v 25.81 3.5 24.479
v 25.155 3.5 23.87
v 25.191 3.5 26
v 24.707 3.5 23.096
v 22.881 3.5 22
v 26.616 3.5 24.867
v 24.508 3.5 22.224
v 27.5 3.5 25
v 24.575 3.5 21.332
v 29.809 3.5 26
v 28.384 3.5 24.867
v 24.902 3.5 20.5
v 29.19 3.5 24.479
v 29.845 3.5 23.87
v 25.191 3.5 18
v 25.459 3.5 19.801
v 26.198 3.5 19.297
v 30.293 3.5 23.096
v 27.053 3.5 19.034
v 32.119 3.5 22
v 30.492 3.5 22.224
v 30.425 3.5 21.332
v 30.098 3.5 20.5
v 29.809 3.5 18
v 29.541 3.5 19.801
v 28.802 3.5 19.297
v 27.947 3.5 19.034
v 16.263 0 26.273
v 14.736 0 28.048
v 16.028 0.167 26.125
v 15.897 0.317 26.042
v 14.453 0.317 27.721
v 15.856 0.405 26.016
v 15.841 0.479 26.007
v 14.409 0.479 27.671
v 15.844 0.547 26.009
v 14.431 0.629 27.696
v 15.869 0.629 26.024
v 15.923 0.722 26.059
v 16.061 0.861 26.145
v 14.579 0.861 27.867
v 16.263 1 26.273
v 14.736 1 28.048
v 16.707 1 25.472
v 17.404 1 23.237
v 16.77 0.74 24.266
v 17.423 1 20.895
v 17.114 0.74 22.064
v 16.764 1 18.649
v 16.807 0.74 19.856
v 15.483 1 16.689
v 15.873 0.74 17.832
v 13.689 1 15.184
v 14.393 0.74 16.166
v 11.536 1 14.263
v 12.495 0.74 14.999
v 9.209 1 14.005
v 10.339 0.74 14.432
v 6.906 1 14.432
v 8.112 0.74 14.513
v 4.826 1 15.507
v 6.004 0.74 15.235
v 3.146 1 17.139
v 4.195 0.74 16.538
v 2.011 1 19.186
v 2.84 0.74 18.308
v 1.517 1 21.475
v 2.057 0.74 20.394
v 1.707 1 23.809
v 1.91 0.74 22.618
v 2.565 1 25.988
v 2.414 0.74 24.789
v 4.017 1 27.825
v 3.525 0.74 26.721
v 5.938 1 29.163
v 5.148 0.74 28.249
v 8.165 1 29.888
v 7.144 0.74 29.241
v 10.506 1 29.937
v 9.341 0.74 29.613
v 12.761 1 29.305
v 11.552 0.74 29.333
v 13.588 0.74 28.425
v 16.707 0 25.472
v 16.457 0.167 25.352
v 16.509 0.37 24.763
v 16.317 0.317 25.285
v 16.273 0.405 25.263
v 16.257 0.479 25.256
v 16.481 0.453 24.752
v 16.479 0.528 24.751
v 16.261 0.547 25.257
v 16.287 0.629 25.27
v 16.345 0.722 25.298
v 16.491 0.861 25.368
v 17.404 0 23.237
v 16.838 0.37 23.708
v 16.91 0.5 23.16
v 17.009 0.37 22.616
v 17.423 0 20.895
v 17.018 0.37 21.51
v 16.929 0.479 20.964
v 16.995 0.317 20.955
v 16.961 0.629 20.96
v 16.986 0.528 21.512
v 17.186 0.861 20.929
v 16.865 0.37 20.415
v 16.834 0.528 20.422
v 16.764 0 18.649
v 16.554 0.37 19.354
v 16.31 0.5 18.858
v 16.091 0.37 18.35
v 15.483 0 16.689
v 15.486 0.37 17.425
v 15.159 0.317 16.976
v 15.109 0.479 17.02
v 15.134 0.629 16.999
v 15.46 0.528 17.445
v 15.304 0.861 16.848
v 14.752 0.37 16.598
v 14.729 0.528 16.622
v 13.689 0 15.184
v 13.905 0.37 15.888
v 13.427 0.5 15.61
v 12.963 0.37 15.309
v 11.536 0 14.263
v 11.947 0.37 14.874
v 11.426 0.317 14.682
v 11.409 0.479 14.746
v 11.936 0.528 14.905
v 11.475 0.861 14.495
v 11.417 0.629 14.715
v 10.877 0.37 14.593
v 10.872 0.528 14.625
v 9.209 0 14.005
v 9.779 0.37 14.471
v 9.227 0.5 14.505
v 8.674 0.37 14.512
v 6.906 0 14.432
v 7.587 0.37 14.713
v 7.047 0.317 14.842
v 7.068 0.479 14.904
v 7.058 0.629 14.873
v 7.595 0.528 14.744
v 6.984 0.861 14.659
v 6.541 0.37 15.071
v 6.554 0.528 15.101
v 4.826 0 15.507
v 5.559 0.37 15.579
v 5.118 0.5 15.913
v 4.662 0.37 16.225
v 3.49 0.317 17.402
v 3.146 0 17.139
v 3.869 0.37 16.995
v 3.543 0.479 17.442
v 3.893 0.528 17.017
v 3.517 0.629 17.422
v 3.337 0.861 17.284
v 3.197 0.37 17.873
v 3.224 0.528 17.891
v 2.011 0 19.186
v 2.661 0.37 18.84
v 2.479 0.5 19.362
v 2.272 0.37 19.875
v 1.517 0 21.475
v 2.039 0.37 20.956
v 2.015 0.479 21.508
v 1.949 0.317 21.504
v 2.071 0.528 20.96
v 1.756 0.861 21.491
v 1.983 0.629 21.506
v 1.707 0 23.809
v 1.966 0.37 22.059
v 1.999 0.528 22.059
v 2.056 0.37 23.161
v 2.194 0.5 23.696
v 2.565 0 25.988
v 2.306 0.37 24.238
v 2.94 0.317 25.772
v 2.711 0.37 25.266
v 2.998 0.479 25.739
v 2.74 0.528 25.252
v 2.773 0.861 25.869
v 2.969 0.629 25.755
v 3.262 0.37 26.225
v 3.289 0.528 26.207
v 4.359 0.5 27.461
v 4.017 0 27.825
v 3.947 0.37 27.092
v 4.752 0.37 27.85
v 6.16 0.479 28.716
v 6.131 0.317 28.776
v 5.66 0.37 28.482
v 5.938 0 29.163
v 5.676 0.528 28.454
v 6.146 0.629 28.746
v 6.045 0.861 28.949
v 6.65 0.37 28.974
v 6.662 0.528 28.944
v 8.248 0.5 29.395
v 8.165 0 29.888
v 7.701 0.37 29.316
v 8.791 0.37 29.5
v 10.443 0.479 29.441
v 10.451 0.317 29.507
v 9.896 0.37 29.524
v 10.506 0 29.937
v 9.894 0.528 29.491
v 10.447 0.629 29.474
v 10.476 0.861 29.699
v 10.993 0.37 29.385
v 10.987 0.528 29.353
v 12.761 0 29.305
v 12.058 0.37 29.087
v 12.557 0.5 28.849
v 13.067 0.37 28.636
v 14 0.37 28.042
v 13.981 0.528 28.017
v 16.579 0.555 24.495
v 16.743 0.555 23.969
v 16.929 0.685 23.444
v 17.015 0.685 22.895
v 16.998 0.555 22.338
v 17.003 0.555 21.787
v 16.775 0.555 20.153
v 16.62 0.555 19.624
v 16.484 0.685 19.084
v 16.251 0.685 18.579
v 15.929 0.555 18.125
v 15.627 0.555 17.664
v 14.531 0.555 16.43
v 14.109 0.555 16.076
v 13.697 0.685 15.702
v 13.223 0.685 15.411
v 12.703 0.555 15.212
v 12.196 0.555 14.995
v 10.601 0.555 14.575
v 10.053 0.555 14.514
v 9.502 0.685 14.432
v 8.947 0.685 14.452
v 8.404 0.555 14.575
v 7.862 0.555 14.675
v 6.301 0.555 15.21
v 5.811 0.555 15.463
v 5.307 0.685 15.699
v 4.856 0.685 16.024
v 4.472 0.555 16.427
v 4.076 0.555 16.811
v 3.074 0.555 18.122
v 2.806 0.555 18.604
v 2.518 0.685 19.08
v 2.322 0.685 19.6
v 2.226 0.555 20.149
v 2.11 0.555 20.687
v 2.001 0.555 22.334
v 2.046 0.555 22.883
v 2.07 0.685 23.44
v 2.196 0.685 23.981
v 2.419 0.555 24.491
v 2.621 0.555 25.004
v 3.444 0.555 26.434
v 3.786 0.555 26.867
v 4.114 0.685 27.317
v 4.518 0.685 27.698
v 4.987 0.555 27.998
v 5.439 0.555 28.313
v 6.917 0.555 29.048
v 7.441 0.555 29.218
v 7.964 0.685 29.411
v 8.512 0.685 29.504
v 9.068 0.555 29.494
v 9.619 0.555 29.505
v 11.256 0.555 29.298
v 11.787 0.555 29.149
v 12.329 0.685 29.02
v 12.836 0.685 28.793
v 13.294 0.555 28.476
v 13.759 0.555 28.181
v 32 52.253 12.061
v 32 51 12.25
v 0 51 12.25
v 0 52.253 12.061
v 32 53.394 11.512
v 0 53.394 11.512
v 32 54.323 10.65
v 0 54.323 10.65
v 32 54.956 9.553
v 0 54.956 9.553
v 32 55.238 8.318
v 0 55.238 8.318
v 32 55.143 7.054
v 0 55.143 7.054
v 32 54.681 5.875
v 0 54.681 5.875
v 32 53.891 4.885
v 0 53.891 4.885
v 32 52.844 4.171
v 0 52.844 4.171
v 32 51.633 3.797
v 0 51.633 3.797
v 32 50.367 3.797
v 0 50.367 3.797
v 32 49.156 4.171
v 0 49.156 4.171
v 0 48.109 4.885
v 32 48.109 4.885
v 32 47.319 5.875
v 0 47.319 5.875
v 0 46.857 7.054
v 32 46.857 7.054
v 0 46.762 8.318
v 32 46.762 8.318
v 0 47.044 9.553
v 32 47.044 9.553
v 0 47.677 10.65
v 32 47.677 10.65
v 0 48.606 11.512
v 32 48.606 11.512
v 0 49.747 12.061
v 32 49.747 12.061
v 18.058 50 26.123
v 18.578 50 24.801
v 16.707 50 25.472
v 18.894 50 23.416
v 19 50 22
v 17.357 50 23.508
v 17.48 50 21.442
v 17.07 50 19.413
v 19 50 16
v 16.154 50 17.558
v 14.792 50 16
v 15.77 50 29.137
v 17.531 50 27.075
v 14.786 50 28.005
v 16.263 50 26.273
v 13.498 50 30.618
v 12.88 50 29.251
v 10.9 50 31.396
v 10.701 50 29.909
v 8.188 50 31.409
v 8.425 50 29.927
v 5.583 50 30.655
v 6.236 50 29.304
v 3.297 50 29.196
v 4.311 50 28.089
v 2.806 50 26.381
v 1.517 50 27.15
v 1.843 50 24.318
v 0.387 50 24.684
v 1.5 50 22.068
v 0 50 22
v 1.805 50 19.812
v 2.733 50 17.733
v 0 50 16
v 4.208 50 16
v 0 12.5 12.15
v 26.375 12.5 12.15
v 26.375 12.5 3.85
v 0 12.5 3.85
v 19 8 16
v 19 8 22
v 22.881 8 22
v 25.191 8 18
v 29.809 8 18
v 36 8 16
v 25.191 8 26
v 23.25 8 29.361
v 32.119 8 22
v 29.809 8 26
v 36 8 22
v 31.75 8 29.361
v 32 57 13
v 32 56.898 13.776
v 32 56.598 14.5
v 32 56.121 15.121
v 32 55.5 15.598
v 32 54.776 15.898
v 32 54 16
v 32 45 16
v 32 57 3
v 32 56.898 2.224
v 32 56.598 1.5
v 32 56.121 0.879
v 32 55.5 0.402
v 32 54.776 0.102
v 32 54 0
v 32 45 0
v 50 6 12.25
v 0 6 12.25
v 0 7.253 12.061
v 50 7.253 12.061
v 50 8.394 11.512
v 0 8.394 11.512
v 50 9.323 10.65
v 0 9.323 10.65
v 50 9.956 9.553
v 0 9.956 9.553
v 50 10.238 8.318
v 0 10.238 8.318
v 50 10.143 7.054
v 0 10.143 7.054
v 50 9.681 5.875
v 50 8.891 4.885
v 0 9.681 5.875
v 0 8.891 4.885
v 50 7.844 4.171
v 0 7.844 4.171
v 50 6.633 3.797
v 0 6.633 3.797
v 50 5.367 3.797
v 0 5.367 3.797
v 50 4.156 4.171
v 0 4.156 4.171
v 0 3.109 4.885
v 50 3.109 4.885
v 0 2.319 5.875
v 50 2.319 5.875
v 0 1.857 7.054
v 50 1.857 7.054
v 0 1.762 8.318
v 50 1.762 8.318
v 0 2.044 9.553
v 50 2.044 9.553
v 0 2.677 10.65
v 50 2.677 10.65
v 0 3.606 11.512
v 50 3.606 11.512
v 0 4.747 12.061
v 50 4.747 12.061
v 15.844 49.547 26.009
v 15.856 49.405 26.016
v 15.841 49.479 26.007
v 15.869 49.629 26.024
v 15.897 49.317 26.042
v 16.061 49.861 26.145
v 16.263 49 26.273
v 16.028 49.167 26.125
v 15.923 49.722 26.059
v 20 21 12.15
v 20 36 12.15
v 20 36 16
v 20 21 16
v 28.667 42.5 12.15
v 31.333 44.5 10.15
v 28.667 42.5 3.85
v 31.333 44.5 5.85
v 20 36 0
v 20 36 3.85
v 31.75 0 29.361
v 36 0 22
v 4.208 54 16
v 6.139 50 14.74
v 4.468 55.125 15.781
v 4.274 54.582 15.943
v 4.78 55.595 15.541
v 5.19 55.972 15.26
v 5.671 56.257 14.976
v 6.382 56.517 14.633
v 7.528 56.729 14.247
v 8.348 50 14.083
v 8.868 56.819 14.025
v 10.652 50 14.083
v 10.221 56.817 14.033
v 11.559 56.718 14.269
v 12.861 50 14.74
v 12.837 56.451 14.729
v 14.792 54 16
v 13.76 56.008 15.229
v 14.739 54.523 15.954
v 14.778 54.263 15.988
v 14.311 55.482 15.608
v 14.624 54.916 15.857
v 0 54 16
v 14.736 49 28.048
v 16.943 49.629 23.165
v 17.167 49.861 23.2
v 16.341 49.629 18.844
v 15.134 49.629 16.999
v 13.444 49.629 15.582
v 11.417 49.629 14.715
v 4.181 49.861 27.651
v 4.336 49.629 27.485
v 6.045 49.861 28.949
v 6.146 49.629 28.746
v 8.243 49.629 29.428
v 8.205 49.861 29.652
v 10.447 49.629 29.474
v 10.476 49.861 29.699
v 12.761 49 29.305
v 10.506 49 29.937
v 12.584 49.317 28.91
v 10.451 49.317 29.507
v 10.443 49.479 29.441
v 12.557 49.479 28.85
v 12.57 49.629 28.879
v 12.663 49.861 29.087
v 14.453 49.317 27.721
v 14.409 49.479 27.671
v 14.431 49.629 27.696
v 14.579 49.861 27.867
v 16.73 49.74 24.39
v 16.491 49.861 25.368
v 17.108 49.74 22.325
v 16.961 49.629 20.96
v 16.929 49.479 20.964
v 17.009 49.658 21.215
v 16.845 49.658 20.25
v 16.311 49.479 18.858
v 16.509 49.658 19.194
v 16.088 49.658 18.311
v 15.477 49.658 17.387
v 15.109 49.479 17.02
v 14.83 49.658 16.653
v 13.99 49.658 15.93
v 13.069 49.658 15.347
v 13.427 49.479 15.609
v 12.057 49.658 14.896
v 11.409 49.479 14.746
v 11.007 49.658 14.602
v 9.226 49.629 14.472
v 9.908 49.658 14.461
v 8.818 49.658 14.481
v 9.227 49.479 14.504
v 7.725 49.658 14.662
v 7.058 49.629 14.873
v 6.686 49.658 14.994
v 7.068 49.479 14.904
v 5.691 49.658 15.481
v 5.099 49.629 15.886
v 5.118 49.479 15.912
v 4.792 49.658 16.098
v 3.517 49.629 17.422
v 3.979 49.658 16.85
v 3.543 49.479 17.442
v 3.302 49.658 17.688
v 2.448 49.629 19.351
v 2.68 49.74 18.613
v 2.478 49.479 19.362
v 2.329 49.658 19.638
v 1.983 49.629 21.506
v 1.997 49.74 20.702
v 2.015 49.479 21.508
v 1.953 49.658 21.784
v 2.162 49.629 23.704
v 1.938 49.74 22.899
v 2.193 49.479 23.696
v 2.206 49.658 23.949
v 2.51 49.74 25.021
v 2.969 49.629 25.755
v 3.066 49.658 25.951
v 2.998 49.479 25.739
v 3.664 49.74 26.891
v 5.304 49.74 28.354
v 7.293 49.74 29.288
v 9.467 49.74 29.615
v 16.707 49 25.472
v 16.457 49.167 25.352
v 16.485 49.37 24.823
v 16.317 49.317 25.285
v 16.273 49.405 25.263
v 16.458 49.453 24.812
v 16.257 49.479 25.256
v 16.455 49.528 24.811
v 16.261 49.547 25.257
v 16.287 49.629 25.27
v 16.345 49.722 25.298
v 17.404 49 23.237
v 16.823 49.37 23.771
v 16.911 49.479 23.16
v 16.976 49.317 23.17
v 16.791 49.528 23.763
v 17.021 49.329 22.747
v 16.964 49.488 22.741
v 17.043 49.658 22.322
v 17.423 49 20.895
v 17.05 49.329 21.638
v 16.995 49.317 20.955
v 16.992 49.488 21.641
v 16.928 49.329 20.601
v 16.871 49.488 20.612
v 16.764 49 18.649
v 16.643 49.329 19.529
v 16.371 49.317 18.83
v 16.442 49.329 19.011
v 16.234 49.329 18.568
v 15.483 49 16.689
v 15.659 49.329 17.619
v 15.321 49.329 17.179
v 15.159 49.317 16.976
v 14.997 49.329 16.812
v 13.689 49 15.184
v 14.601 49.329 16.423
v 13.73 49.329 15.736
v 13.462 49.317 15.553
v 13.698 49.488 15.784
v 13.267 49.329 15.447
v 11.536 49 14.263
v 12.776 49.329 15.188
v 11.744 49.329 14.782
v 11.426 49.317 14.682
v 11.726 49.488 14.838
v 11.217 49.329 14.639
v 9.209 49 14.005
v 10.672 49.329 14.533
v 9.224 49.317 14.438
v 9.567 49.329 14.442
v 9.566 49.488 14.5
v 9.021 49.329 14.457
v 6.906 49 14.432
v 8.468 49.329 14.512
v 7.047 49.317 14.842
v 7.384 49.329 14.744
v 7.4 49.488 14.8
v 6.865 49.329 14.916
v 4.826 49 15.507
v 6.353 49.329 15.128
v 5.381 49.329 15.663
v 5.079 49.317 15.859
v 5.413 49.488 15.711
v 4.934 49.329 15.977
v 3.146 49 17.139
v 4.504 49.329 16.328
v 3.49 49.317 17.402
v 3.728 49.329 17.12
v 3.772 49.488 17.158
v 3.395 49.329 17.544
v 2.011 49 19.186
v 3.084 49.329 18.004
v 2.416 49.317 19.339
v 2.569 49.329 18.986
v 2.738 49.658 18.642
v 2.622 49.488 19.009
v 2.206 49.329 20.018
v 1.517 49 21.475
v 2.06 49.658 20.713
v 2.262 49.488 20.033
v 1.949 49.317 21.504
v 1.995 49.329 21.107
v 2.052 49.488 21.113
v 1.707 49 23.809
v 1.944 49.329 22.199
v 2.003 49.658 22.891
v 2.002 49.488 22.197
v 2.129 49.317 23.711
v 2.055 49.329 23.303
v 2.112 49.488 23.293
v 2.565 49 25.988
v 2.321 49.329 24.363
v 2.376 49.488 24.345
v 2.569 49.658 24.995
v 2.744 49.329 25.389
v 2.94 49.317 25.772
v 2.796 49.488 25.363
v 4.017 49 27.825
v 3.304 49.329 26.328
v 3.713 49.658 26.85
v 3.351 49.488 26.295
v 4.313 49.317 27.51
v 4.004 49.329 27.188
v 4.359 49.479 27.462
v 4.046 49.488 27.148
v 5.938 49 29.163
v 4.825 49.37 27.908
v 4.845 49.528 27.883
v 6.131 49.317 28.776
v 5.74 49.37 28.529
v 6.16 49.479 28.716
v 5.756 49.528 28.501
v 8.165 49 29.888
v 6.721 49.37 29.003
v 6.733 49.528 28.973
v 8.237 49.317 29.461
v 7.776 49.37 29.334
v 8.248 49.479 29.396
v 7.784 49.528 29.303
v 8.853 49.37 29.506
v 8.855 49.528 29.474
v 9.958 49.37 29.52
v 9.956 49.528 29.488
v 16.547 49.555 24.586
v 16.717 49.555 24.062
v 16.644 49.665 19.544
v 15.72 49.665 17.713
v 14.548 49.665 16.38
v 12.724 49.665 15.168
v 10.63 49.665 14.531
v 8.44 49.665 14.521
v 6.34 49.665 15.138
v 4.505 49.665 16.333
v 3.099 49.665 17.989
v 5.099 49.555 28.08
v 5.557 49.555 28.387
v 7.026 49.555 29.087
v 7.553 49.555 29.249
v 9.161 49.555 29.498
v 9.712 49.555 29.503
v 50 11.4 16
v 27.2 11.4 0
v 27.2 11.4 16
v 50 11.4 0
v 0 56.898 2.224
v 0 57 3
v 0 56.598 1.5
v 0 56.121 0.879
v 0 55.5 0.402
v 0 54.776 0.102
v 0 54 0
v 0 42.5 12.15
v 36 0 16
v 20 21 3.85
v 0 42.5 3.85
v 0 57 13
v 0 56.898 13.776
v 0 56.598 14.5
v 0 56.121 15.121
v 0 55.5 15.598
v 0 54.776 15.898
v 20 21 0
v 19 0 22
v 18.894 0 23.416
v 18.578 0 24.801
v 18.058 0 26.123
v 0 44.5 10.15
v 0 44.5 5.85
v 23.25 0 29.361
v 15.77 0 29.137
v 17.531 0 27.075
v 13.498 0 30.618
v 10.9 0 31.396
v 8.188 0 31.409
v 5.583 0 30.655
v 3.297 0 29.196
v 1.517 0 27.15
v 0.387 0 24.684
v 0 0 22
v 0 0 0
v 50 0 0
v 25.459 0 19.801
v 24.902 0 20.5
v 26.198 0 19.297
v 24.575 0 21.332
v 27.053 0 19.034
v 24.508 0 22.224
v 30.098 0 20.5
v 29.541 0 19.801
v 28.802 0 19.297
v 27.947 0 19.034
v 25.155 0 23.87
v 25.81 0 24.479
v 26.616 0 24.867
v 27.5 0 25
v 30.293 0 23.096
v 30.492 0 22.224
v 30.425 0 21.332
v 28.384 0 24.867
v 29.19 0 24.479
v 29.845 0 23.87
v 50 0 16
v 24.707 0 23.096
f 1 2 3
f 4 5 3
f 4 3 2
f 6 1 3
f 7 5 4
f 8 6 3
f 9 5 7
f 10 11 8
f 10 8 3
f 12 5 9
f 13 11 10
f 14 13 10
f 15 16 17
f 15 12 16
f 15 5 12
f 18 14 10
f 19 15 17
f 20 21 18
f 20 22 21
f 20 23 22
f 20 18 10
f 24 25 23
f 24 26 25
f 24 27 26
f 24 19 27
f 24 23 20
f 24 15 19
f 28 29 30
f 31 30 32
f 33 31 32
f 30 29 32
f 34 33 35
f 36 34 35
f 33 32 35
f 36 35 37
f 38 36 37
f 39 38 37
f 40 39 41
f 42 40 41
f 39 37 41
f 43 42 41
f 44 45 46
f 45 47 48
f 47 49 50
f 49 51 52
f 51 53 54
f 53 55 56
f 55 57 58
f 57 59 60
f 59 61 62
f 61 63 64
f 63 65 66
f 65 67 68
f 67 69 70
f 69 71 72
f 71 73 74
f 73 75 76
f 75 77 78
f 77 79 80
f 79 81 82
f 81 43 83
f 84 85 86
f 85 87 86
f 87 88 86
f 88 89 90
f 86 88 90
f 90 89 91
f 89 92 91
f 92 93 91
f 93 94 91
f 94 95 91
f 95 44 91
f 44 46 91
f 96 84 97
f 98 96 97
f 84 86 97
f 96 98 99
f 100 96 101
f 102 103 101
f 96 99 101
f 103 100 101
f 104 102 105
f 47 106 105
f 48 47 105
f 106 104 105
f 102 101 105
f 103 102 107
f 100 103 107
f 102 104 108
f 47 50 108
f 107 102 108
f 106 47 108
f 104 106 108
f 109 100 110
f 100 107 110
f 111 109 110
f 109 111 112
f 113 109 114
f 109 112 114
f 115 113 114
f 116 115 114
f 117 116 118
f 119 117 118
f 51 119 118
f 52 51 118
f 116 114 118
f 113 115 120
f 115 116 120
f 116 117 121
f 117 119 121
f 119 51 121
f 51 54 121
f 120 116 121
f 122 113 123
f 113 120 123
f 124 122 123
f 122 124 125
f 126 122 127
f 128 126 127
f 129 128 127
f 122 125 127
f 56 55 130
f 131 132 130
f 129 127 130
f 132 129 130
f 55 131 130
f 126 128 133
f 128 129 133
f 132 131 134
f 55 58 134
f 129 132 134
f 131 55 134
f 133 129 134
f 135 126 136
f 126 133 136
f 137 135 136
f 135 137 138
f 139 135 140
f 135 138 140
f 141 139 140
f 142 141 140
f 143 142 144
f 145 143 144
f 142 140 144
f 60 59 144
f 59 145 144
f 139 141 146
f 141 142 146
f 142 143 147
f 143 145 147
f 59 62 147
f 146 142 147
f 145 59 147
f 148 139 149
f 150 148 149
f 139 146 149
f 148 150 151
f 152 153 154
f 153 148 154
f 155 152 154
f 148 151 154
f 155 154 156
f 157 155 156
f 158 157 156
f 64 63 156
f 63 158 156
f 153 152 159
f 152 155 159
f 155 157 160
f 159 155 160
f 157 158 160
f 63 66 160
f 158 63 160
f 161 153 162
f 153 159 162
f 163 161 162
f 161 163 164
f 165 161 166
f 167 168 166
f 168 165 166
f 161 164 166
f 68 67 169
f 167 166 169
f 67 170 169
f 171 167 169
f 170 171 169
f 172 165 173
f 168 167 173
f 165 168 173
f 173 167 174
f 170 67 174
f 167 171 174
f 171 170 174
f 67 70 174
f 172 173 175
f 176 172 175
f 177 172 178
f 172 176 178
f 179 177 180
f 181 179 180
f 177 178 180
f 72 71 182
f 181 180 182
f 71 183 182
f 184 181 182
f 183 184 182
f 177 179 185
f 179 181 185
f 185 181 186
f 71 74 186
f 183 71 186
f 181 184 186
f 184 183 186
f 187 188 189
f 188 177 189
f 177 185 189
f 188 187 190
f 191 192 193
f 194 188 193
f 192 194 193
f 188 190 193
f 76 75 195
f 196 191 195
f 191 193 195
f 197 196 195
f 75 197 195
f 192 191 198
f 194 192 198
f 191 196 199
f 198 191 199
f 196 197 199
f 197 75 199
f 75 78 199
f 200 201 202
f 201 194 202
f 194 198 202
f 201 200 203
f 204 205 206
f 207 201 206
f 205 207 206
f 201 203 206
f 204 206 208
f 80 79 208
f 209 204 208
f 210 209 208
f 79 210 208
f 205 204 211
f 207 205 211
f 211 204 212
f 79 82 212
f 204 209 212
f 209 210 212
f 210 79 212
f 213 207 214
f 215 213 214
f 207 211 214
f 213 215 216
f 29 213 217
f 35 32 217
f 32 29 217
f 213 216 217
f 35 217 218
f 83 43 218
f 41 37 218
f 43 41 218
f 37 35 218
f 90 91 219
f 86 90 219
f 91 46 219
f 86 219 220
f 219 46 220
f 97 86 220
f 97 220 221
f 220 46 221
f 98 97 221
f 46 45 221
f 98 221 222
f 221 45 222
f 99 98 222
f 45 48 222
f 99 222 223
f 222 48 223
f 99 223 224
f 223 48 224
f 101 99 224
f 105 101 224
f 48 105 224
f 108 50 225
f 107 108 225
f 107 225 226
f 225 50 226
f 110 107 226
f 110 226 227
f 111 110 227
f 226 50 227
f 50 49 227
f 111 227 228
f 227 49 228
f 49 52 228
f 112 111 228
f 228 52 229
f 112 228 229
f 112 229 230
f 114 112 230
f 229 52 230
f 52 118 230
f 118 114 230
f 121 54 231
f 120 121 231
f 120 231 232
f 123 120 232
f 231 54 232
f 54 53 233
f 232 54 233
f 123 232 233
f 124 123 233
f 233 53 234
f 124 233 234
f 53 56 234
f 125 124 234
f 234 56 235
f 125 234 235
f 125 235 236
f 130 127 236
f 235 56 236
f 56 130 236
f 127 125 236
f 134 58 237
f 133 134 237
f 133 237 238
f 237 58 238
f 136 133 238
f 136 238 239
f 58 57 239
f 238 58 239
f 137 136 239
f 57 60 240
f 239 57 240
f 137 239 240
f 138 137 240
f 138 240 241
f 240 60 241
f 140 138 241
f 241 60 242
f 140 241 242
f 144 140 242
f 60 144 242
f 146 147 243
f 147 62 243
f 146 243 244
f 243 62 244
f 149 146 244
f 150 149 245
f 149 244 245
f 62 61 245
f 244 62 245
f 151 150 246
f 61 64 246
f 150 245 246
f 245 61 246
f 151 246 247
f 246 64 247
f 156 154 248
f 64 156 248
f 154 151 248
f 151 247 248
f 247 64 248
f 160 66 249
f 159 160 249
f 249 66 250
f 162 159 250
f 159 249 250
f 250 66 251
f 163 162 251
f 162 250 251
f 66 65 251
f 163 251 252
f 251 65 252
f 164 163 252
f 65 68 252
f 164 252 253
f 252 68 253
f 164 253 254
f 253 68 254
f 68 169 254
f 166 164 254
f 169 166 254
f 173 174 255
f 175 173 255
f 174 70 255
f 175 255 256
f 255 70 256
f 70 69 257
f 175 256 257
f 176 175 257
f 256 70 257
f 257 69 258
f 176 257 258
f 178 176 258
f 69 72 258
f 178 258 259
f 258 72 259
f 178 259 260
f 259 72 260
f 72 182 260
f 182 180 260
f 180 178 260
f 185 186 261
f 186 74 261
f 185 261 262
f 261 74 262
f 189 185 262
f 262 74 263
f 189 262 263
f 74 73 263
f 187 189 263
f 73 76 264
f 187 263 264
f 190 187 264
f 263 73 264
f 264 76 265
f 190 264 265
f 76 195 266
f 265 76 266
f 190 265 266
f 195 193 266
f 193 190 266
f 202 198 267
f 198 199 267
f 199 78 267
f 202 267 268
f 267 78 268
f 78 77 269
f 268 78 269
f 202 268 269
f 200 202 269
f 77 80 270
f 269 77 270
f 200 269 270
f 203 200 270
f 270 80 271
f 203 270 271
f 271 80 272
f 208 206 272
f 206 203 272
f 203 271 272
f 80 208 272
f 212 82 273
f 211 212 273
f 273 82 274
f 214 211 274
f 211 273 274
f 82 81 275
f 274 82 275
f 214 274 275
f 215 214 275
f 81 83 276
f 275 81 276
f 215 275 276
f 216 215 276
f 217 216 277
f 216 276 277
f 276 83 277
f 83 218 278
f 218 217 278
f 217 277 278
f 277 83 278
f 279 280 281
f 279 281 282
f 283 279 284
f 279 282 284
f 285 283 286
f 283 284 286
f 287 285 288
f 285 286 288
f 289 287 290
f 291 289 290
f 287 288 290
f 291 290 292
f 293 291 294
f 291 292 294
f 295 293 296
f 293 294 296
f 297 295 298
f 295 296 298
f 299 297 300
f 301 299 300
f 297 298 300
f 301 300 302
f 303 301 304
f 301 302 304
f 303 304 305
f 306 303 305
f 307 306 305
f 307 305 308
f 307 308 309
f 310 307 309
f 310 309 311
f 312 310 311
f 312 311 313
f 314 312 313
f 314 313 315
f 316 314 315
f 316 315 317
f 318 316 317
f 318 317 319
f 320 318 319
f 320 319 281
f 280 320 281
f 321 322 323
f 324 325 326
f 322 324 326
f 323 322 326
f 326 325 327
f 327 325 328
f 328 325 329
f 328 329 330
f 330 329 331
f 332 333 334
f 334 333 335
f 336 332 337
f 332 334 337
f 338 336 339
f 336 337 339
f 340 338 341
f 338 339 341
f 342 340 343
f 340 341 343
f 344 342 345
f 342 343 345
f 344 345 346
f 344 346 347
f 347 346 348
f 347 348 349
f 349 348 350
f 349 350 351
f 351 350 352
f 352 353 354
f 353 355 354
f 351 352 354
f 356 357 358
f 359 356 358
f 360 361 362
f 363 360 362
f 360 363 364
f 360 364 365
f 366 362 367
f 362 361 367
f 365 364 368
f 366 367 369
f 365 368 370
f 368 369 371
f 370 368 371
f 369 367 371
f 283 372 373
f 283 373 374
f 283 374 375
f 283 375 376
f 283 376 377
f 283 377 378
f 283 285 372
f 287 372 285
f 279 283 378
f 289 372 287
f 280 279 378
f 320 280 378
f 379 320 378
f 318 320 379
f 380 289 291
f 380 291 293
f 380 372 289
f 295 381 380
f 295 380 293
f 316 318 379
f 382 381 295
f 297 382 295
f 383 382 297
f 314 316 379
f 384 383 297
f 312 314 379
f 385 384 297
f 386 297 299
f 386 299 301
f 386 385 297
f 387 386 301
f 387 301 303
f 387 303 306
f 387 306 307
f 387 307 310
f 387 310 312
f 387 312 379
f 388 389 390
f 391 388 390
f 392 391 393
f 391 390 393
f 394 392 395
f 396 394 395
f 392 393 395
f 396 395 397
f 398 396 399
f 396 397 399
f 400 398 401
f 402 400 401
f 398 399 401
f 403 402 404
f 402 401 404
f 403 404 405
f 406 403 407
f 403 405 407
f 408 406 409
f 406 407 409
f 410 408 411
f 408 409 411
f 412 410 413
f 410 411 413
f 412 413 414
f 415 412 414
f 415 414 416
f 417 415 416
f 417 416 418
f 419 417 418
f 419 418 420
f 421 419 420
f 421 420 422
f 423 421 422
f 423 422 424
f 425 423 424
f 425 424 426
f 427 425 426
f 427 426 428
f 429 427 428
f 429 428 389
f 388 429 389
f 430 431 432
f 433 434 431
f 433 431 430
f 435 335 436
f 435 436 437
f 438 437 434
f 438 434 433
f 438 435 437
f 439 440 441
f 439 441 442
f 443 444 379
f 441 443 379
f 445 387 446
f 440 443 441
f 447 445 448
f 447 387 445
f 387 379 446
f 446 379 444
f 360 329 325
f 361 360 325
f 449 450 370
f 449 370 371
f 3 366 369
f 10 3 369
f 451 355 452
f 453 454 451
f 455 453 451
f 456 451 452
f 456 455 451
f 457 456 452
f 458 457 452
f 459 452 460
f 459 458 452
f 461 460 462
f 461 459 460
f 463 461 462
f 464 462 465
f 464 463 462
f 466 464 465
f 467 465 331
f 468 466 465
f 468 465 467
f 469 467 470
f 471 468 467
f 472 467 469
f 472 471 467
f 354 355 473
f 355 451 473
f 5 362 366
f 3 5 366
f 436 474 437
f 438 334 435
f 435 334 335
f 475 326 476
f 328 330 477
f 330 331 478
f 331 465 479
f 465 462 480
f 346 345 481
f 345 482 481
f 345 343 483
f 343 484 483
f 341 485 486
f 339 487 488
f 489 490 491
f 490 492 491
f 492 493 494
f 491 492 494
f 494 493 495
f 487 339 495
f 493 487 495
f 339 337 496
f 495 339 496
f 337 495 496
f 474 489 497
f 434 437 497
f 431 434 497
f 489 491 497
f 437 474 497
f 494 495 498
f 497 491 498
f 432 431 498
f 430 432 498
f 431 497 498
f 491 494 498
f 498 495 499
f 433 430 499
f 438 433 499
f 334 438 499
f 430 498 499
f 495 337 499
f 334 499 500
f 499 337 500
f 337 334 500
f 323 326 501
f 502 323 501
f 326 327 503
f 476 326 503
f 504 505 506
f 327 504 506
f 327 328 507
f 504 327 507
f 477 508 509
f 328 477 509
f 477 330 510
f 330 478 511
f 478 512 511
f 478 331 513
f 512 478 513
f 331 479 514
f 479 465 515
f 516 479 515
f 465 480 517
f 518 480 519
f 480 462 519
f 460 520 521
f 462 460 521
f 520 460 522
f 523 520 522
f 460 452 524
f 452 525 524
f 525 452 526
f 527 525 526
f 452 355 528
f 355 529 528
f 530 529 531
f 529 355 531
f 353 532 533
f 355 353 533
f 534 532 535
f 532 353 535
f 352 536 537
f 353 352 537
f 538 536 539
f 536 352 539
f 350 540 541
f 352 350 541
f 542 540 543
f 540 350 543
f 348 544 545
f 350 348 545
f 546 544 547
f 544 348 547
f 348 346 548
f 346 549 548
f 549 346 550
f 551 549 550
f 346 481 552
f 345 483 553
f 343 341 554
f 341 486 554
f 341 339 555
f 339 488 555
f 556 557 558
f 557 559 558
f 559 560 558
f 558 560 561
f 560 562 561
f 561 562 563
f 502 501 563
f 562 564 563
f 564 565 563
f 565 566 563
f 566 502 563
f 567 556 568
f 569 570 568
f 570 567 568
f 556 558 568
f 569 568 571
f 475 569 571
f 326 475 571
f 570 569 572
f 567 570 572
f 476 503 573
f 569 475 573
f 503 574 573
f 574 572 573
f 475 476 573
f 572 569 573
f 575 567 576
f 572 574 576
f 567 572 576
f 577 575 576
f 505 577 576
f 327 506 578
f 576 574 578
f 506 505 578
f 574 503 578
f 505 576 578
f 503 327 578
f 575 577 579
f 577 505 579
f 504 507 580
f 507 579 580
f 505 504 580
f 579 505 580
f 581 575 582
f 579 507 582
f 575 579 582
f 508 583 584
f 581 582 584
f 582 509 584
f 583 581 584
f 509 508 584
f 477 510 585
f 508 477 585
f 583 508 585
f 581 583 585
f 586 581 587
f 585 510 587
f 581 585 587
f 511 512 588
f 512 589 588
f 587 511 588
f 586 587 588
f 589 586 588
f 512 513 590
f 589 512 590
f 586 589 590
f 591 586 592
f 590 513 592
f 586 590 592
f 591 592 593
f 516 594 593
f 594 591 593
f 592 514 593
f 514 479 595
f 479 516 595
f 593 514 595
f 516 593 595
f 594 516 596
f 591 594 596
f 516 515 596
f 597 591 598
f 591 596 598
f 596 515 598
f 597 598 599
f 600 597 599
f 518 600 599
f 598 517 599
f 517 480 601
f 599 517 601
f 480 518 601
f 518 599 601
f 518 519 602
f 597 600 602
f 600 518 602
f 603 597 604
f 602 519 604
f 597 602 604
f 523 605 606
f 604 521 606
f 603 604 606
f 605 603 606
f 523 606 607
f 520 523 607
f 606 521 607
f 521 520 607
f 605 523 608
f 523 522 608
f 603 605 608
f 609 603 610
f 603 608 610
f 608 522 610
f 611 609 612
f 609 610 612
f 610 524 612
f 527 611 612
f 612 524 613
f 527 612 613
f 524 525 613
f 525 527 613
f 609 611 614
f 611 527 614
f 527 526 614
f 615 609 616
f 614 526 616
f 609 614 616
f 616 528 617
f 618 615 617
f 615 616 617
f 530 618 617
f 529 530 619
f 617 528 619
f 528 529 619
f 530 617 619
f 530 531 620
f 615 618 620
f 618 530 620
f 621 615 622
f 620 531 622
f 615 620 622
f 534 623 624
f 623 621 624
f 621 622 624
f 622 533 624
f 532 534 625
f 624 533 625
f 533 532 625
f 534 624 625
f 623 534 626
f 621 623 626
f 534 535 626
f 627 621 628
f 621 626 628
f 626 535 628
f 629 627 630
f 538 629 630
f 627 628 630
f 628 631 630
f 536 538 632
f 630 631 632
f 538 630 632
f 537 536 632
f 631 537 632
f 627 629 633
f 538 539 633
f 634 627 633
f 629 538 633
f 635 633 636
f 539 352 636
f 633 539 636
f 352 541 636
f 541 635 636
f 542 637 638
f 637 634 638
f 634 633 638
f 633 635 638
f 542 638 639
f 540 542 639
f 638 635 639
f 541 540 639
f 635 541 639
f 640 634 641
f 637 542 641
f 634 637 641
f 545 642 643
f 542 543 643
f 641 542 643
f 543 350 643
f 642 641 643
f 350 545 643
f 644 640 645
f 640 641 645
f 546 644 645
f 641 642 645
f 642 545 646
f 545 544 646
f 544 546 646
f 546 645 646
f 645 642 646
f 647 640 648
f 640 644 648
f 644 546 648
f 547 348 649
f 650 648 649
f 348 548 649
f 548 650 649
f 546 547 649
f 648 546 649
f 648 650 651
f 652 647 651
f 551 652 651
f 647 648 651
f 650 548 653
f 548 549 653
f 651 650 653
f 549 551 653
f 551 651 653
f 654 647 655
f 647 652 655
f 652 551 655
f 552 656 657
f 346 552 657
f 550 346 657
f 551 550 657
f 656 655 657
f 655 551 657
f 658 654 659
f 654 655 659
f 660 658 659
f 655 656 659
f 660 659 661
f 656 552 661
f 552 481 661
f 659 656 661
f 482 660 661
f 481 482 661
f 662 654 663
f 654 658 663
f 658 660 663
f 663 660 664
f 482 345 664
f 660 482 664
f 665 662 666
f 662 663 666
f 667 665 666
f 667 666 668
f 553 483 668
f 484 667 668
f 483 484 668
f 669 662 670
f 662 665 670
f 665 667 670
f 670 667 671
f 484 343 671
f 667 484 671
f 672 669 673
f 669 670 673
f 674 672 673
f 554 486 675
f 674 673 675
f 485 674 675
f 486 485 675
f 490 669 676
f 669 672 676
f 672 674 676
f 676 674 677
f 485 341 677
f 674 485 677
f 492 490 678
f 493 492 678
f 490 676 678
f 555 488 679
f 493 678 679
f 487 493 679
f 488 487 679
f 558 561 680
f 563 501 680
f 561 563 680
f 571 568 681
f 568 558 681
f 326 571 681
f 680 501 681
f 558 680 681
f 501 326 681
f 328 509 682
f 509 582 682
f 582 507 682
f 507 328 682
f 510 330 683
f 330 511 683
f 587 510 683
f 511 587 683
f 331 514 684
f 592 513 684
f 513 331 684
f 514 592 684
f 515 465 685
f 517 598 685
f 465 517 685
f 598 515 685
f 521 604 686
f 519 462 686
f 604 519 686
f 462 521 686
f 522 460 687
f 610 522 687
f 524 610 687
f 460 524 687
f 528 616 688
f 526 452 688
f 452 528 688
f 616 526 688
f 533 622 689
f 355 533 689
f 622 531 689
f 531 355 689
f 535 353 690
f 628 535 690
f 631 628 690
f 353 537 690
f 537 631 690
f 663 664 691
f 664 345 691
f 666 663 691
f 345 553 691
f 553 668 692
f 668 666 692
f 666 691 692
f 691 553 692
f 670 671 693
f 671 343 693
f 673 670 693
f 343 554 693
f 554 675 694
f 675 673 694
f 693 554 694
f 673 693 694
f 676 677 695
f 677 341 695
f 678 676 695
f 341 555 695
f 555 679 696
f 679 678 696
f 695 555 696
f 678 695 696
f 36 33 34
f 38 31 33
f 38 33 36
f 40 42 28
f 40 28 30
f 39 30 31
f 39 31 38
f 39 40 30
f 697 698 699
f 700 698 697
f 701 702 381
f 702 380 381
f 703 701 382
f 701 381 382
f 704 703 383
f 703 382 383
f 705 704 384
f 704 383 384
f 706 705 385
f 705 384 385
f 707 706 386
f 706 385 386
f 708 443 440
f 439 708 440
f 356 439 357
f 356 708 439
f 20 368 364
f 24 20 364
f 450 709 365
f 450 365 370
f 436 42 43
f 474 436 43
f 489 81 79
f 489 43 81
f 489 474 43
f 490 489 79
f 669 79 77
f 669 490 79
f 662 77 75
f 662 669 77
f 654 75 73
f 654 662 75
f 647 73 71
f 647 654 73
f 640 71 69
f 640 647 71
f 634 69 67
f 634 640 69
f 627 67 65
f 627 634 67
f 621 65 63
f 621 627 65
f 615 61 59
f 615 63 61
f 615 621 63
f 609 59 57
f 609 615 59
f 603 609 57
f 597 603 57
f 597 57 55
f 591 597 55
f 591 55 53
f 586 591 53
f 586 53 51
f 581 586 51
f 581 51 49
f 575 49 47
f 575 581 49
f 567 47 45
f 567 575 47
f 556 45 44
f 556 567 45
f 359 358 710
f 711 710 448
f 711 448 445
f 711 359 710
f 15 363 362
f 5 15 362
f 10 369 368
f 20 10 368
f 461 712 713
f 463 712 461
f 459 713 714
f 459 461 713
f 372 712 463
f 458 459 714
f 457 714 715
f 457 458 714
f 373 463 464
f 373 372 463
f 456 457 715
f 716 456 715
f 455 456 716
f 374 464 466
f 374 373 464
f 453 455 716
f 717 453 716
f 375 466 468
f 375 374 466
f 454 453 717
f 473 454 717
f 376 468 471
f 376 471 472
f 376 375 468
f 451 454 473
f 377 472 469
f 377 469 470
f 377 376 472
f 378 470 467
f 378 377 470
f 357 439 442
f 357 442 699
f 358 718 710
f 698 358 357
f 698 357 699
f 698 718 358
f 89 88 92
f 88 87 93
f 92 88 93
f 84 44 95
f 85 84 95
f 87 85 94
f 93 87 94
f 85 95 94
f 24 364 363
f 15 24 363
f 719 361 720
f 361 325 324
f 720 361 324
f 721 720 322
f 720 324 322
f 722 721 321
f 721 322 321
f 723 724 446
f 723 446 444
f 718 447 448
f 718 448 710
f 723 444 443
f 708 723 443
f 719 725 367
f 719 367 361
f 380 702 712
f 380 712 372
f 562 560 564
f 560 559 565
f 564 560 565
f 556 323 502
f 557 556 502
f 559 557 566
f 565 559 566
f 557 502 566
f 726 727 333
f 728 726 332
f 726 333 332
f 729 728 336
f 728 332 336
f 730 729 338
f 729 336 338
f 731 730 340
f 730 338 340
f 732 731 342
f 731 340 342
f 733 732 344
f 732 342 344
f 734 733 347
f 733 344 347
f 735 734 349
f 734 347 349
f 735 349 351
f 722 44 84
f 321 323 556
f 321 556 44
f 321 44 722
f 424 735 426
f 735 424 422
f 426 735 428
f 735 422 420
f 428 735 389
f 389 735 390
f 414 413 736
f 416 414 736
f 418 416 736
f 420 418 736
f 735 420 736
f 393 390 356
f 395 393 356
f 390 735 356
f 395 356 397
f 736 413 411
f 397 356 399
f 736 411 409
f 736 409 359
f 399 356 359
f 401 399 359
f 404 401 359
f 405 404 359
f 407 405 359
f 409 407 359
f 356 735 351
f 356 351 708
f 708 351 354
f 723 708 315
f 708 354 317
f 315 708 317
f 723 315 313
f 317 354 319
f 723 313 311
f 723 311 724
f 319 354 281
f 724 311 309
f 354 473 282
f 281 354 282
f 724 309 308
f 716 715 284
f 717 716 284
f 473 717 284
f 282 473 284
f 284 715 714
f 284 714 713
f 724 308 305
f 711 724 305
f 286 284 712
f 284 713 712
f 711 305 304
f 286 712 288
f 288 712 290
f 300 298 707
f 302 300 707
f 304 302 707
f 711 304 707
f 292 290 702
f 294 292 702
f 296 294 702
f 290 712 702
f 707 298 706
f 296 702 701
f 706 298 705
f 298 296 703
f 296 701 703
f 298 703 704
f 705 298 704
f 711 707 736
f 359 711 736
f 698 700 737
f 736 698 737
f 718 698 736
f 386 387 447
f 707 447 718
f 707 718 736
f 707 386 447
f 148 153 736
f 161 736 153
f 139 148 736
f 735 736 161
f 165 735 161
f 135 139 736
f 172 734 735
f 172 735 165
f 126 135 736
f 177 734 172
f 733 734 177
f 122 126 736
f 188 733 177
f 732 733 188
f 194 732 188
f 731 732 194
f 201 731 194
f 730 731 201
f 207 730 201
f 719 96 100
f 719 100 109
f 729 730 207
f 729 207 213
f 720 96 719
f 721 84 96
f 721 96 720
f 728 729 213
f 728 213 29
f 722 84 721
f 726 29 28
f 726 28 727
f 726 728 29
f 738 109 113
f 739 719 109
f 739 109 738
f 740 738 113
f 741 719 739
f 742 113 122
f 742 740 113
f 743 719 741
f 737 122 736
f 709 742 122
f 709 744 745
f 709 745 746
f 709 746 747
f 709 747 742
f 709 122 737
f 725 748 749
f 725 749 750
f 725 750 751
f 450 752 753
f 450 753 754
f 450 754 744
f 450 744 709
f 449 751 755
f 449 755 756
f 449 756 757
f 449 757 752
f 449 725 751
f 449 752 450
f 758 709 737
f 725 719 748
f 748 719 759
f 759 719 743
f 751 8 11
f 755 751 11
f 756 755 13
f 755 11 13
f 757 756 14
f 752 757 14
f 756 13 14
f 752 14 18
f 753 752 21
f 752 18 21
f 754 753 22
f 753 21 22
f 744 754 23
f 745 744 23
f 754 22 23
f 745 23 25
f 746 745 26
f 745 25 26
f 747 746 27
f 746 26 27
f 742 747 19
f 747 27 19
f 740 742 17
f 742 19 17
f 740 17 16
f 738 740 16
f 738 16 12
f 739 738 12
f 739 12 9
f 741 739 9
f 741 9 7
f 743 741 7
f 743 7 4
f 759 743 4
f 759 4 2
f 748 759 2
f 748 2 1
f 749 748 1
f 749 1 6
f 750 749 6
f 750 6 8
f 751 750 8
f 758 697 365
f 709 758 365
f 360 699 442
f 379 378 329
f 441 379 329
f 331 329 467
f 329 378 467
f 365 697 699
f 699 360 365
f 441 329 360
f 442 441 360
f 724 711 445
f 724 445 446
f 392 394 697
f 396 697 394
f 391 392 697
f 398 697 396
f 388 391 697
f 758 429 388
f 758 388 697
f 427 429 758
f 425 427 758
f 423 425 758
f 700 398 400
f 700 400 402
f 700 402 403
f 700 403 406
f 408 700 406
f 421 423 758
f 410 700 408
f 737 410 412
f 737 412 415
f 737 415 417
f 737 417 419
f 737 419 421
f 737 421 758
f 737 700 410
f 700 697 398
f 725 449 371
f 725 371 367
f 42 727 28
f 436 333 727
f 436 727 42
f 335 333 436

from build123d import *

# Parameters (mm, degrees)
BOSS_EXTRU_1_DEPTH           = 16
CONG_1_R                     = 3
ESQUISSE2_R                  = 4.25
ENL_V_MAT_EXTRU_1_DEPTH      = 78.491935064
BOSS_EXTRU_3_DEPTH           = 50
ENL_V_MAT_EXTRU_3_DEPTH      = 78.409624725
ENL_V_MAT_EXTRU_3_DEPTH_BACK = 78.409624725
BOSS_EXTRU_4_DEPTH           = 8
ENL_V_MAT_EXTRU_5_DEPTH      = 4.5
ESQUISSE10_R                 = 3
ENL_V_MAT_EXTRU_6_DEPTH      = 80.71511783


with BuildPart() as part:
    # Esquisse1 → Boss.-Extru.1 (new body)
    with BuildSketch(Plane.XY):
        Polygon((0, 0), (0, 57), (32, 57), (32, 45), (20, 36), (20, 21), (27.2, 11.4), (50, 11.4), (50, 0), align=None)
    extrude(amount=BOSS_EXTRU_1_DEPTH)

    # Congé1
    cong_1_edges = [part.edges().sort_by_distance(p)[0] for p in [
        (16, 57, 16),
        (16, 57, 0),
    ]]
    fillet(cong_1_edges, radius=CONG_1_R)

    # Esquisse2 → Enlèv. mat.-Extru.1 (cut, through all)
    with BuildSketch(Plane.ZY):
        with Locations((8, 51)):
            Circle(ESQUISSE2_R)
        with Locations((8, 6)):
            Circle(ESQUISSE2_R)
        Polygon((3.85, 42.5), (5.85, 44.5), (10.15, 44.5), (12.15, 42.5), (12.15, 12.5), (3.85, 12.5), align=None)
    extrude(amount=-ENL_V_MAT_EXTRU_1_DEPTH, mode=Mode.SUBTRACT)

    # Esquisse4 → Boss.-Extru.3 (add)
    with BuildSketch(Plane(origin=(0, 50, 0), x_dir=(1, 0, 0), z_dir=(0, 1, 0))):
        with BuildLine():
            Line((0, -22), (0, -16))
            Line((0, -16), (19, -16))
            Line((19, -16), (19, -22))
            ThreePointArc((19, -22), (9.5, -31.5), (0, -22))
        make_face()
    extrude(amount=-BOSS_EXTRU_3_DEPTH)

    # Esquisse3 → Enlèv. mat.-Extru.3 (cut, two sides)
    with BuildSketch(Plane(origin=(0, 50, 0), x_dir=(1, 0, 0), z_dir=(0, 1, 0))) as enl_v_mat_extru_3_sk:
        with BuildLine():
            Line((16.707123586, -25.472372332), (18.897371319, -26.527627668))
            Line((18.897371319, -26.527627668), (18.376515469, -27.608696206))
            Line((18.376515469, -27.608696206), (16.263059405, -26.273292348))
            ThreePointArc((16.263059405, -26.273292348), (2.5034386, -18.120808257), (16.707123586, -25.472372332))
        make_face()
    extrude(amount=ENL_V_MAT_EXTRU_3_DEPTH, mode=Mode.SUBTRACT)
    extrude(enl_v_mat_extru_3_sk.sketch, amount=-ENL_V_MAT_EXTRU_3_DEPTH_BACK, mode=Mode.SUBTRACT)

    # Esquisse7 → Boss.-Extru.4 (add)
    with BuildSketch(Plane.XZ):
        Polygon((31.75, 14.638784068), (36, 22), (31.75, 29.361215932), (23.25, 29.361215932), (19, 22), (23.25, 14.638784068), align=None)
        Polygon((36, 14.638784068), (36, 22), (31.75, 14.638784068), align=None)
        Polygon((19, 14.638784068), (23.25, 14.638784068), (19, 22), align=None)
    extrude(amount=-BOSS_EXTRU_4_DEPTH)

    # Esquisse8 → Enlèv. mat.-Extru.5 (cut)
    with BuildSketch(Plane(origin=(0, 8, 0), x_dir=(1, 0, 0), z_dir=(0, 1, 0))):
        Polygon((32.118802154, -22), (29.809401077, -18), (25.190598923, -18), (22.881197846, -22), (25.190598923, -26), (29.809401077, -26), align=None)
    extrude(amount=-ENL_V_MAT_EXTRU_5_DEPTH, mode=Mode.SUBTRACT)

    # Esquisse10 → Enlèv. mat.-Extru.6 (cut, through all)
    with BuildSketch(Plane(origin=(0, 3.5, 0), x_dir=(1, 0, 0), z_dir=(0, 1, 0))):
        with Locations(Location((27.5, -22, 0), (0, 0, 270))):
            Circle(ESQUISSE10_R)
    extrude(amount=-ENL_V_MAT_EXTRU_6_DEPTH, mode=Mode.SUBTRACT)

    # Balayage1: sweep along a curve in space
    with BuildLine() as balayage1_path:
        ThreePointArc((16.707123586, 0, 25.472372332), (2.5034386, 0, 18.120808257), (16.263059405, 0, 26.273292348))
    # Esquisse11 → Balayage1 (sweep)
    with BuildSketch(Plane(origin=(-7.22393592, 0, 11.432849379), x_dir=(-0.8453824255948864, 0, -0.5341615434447772), z_dir=(0.5341615434447772, 0, -0.8453824255948864))):
        with BuildLine():
            Line((-27.782686999, 50), (-27.782686999, 49))
            add(Edge.make_bspline(
                [(-27.782686999, 50), (-26.782686999, 49.5), (-27.782686999, 49)],
                knots=[0, 0, 0, 1, 1, 1], degree=2))
        make_face()
        with BuildLine():
            Line((-27.782686999, 0), (-27.782686999, 1))
            add(Edge.make_bspline(
                [(-27.782686999, 0), (-26.782686999, 0.5), (-27.782686999, 1)],
                knots=[0, 0, 0, 1, 1, 1], degree=2))
        make_face()
    sweep(path=balayage1_path.line)


solid = part.part
